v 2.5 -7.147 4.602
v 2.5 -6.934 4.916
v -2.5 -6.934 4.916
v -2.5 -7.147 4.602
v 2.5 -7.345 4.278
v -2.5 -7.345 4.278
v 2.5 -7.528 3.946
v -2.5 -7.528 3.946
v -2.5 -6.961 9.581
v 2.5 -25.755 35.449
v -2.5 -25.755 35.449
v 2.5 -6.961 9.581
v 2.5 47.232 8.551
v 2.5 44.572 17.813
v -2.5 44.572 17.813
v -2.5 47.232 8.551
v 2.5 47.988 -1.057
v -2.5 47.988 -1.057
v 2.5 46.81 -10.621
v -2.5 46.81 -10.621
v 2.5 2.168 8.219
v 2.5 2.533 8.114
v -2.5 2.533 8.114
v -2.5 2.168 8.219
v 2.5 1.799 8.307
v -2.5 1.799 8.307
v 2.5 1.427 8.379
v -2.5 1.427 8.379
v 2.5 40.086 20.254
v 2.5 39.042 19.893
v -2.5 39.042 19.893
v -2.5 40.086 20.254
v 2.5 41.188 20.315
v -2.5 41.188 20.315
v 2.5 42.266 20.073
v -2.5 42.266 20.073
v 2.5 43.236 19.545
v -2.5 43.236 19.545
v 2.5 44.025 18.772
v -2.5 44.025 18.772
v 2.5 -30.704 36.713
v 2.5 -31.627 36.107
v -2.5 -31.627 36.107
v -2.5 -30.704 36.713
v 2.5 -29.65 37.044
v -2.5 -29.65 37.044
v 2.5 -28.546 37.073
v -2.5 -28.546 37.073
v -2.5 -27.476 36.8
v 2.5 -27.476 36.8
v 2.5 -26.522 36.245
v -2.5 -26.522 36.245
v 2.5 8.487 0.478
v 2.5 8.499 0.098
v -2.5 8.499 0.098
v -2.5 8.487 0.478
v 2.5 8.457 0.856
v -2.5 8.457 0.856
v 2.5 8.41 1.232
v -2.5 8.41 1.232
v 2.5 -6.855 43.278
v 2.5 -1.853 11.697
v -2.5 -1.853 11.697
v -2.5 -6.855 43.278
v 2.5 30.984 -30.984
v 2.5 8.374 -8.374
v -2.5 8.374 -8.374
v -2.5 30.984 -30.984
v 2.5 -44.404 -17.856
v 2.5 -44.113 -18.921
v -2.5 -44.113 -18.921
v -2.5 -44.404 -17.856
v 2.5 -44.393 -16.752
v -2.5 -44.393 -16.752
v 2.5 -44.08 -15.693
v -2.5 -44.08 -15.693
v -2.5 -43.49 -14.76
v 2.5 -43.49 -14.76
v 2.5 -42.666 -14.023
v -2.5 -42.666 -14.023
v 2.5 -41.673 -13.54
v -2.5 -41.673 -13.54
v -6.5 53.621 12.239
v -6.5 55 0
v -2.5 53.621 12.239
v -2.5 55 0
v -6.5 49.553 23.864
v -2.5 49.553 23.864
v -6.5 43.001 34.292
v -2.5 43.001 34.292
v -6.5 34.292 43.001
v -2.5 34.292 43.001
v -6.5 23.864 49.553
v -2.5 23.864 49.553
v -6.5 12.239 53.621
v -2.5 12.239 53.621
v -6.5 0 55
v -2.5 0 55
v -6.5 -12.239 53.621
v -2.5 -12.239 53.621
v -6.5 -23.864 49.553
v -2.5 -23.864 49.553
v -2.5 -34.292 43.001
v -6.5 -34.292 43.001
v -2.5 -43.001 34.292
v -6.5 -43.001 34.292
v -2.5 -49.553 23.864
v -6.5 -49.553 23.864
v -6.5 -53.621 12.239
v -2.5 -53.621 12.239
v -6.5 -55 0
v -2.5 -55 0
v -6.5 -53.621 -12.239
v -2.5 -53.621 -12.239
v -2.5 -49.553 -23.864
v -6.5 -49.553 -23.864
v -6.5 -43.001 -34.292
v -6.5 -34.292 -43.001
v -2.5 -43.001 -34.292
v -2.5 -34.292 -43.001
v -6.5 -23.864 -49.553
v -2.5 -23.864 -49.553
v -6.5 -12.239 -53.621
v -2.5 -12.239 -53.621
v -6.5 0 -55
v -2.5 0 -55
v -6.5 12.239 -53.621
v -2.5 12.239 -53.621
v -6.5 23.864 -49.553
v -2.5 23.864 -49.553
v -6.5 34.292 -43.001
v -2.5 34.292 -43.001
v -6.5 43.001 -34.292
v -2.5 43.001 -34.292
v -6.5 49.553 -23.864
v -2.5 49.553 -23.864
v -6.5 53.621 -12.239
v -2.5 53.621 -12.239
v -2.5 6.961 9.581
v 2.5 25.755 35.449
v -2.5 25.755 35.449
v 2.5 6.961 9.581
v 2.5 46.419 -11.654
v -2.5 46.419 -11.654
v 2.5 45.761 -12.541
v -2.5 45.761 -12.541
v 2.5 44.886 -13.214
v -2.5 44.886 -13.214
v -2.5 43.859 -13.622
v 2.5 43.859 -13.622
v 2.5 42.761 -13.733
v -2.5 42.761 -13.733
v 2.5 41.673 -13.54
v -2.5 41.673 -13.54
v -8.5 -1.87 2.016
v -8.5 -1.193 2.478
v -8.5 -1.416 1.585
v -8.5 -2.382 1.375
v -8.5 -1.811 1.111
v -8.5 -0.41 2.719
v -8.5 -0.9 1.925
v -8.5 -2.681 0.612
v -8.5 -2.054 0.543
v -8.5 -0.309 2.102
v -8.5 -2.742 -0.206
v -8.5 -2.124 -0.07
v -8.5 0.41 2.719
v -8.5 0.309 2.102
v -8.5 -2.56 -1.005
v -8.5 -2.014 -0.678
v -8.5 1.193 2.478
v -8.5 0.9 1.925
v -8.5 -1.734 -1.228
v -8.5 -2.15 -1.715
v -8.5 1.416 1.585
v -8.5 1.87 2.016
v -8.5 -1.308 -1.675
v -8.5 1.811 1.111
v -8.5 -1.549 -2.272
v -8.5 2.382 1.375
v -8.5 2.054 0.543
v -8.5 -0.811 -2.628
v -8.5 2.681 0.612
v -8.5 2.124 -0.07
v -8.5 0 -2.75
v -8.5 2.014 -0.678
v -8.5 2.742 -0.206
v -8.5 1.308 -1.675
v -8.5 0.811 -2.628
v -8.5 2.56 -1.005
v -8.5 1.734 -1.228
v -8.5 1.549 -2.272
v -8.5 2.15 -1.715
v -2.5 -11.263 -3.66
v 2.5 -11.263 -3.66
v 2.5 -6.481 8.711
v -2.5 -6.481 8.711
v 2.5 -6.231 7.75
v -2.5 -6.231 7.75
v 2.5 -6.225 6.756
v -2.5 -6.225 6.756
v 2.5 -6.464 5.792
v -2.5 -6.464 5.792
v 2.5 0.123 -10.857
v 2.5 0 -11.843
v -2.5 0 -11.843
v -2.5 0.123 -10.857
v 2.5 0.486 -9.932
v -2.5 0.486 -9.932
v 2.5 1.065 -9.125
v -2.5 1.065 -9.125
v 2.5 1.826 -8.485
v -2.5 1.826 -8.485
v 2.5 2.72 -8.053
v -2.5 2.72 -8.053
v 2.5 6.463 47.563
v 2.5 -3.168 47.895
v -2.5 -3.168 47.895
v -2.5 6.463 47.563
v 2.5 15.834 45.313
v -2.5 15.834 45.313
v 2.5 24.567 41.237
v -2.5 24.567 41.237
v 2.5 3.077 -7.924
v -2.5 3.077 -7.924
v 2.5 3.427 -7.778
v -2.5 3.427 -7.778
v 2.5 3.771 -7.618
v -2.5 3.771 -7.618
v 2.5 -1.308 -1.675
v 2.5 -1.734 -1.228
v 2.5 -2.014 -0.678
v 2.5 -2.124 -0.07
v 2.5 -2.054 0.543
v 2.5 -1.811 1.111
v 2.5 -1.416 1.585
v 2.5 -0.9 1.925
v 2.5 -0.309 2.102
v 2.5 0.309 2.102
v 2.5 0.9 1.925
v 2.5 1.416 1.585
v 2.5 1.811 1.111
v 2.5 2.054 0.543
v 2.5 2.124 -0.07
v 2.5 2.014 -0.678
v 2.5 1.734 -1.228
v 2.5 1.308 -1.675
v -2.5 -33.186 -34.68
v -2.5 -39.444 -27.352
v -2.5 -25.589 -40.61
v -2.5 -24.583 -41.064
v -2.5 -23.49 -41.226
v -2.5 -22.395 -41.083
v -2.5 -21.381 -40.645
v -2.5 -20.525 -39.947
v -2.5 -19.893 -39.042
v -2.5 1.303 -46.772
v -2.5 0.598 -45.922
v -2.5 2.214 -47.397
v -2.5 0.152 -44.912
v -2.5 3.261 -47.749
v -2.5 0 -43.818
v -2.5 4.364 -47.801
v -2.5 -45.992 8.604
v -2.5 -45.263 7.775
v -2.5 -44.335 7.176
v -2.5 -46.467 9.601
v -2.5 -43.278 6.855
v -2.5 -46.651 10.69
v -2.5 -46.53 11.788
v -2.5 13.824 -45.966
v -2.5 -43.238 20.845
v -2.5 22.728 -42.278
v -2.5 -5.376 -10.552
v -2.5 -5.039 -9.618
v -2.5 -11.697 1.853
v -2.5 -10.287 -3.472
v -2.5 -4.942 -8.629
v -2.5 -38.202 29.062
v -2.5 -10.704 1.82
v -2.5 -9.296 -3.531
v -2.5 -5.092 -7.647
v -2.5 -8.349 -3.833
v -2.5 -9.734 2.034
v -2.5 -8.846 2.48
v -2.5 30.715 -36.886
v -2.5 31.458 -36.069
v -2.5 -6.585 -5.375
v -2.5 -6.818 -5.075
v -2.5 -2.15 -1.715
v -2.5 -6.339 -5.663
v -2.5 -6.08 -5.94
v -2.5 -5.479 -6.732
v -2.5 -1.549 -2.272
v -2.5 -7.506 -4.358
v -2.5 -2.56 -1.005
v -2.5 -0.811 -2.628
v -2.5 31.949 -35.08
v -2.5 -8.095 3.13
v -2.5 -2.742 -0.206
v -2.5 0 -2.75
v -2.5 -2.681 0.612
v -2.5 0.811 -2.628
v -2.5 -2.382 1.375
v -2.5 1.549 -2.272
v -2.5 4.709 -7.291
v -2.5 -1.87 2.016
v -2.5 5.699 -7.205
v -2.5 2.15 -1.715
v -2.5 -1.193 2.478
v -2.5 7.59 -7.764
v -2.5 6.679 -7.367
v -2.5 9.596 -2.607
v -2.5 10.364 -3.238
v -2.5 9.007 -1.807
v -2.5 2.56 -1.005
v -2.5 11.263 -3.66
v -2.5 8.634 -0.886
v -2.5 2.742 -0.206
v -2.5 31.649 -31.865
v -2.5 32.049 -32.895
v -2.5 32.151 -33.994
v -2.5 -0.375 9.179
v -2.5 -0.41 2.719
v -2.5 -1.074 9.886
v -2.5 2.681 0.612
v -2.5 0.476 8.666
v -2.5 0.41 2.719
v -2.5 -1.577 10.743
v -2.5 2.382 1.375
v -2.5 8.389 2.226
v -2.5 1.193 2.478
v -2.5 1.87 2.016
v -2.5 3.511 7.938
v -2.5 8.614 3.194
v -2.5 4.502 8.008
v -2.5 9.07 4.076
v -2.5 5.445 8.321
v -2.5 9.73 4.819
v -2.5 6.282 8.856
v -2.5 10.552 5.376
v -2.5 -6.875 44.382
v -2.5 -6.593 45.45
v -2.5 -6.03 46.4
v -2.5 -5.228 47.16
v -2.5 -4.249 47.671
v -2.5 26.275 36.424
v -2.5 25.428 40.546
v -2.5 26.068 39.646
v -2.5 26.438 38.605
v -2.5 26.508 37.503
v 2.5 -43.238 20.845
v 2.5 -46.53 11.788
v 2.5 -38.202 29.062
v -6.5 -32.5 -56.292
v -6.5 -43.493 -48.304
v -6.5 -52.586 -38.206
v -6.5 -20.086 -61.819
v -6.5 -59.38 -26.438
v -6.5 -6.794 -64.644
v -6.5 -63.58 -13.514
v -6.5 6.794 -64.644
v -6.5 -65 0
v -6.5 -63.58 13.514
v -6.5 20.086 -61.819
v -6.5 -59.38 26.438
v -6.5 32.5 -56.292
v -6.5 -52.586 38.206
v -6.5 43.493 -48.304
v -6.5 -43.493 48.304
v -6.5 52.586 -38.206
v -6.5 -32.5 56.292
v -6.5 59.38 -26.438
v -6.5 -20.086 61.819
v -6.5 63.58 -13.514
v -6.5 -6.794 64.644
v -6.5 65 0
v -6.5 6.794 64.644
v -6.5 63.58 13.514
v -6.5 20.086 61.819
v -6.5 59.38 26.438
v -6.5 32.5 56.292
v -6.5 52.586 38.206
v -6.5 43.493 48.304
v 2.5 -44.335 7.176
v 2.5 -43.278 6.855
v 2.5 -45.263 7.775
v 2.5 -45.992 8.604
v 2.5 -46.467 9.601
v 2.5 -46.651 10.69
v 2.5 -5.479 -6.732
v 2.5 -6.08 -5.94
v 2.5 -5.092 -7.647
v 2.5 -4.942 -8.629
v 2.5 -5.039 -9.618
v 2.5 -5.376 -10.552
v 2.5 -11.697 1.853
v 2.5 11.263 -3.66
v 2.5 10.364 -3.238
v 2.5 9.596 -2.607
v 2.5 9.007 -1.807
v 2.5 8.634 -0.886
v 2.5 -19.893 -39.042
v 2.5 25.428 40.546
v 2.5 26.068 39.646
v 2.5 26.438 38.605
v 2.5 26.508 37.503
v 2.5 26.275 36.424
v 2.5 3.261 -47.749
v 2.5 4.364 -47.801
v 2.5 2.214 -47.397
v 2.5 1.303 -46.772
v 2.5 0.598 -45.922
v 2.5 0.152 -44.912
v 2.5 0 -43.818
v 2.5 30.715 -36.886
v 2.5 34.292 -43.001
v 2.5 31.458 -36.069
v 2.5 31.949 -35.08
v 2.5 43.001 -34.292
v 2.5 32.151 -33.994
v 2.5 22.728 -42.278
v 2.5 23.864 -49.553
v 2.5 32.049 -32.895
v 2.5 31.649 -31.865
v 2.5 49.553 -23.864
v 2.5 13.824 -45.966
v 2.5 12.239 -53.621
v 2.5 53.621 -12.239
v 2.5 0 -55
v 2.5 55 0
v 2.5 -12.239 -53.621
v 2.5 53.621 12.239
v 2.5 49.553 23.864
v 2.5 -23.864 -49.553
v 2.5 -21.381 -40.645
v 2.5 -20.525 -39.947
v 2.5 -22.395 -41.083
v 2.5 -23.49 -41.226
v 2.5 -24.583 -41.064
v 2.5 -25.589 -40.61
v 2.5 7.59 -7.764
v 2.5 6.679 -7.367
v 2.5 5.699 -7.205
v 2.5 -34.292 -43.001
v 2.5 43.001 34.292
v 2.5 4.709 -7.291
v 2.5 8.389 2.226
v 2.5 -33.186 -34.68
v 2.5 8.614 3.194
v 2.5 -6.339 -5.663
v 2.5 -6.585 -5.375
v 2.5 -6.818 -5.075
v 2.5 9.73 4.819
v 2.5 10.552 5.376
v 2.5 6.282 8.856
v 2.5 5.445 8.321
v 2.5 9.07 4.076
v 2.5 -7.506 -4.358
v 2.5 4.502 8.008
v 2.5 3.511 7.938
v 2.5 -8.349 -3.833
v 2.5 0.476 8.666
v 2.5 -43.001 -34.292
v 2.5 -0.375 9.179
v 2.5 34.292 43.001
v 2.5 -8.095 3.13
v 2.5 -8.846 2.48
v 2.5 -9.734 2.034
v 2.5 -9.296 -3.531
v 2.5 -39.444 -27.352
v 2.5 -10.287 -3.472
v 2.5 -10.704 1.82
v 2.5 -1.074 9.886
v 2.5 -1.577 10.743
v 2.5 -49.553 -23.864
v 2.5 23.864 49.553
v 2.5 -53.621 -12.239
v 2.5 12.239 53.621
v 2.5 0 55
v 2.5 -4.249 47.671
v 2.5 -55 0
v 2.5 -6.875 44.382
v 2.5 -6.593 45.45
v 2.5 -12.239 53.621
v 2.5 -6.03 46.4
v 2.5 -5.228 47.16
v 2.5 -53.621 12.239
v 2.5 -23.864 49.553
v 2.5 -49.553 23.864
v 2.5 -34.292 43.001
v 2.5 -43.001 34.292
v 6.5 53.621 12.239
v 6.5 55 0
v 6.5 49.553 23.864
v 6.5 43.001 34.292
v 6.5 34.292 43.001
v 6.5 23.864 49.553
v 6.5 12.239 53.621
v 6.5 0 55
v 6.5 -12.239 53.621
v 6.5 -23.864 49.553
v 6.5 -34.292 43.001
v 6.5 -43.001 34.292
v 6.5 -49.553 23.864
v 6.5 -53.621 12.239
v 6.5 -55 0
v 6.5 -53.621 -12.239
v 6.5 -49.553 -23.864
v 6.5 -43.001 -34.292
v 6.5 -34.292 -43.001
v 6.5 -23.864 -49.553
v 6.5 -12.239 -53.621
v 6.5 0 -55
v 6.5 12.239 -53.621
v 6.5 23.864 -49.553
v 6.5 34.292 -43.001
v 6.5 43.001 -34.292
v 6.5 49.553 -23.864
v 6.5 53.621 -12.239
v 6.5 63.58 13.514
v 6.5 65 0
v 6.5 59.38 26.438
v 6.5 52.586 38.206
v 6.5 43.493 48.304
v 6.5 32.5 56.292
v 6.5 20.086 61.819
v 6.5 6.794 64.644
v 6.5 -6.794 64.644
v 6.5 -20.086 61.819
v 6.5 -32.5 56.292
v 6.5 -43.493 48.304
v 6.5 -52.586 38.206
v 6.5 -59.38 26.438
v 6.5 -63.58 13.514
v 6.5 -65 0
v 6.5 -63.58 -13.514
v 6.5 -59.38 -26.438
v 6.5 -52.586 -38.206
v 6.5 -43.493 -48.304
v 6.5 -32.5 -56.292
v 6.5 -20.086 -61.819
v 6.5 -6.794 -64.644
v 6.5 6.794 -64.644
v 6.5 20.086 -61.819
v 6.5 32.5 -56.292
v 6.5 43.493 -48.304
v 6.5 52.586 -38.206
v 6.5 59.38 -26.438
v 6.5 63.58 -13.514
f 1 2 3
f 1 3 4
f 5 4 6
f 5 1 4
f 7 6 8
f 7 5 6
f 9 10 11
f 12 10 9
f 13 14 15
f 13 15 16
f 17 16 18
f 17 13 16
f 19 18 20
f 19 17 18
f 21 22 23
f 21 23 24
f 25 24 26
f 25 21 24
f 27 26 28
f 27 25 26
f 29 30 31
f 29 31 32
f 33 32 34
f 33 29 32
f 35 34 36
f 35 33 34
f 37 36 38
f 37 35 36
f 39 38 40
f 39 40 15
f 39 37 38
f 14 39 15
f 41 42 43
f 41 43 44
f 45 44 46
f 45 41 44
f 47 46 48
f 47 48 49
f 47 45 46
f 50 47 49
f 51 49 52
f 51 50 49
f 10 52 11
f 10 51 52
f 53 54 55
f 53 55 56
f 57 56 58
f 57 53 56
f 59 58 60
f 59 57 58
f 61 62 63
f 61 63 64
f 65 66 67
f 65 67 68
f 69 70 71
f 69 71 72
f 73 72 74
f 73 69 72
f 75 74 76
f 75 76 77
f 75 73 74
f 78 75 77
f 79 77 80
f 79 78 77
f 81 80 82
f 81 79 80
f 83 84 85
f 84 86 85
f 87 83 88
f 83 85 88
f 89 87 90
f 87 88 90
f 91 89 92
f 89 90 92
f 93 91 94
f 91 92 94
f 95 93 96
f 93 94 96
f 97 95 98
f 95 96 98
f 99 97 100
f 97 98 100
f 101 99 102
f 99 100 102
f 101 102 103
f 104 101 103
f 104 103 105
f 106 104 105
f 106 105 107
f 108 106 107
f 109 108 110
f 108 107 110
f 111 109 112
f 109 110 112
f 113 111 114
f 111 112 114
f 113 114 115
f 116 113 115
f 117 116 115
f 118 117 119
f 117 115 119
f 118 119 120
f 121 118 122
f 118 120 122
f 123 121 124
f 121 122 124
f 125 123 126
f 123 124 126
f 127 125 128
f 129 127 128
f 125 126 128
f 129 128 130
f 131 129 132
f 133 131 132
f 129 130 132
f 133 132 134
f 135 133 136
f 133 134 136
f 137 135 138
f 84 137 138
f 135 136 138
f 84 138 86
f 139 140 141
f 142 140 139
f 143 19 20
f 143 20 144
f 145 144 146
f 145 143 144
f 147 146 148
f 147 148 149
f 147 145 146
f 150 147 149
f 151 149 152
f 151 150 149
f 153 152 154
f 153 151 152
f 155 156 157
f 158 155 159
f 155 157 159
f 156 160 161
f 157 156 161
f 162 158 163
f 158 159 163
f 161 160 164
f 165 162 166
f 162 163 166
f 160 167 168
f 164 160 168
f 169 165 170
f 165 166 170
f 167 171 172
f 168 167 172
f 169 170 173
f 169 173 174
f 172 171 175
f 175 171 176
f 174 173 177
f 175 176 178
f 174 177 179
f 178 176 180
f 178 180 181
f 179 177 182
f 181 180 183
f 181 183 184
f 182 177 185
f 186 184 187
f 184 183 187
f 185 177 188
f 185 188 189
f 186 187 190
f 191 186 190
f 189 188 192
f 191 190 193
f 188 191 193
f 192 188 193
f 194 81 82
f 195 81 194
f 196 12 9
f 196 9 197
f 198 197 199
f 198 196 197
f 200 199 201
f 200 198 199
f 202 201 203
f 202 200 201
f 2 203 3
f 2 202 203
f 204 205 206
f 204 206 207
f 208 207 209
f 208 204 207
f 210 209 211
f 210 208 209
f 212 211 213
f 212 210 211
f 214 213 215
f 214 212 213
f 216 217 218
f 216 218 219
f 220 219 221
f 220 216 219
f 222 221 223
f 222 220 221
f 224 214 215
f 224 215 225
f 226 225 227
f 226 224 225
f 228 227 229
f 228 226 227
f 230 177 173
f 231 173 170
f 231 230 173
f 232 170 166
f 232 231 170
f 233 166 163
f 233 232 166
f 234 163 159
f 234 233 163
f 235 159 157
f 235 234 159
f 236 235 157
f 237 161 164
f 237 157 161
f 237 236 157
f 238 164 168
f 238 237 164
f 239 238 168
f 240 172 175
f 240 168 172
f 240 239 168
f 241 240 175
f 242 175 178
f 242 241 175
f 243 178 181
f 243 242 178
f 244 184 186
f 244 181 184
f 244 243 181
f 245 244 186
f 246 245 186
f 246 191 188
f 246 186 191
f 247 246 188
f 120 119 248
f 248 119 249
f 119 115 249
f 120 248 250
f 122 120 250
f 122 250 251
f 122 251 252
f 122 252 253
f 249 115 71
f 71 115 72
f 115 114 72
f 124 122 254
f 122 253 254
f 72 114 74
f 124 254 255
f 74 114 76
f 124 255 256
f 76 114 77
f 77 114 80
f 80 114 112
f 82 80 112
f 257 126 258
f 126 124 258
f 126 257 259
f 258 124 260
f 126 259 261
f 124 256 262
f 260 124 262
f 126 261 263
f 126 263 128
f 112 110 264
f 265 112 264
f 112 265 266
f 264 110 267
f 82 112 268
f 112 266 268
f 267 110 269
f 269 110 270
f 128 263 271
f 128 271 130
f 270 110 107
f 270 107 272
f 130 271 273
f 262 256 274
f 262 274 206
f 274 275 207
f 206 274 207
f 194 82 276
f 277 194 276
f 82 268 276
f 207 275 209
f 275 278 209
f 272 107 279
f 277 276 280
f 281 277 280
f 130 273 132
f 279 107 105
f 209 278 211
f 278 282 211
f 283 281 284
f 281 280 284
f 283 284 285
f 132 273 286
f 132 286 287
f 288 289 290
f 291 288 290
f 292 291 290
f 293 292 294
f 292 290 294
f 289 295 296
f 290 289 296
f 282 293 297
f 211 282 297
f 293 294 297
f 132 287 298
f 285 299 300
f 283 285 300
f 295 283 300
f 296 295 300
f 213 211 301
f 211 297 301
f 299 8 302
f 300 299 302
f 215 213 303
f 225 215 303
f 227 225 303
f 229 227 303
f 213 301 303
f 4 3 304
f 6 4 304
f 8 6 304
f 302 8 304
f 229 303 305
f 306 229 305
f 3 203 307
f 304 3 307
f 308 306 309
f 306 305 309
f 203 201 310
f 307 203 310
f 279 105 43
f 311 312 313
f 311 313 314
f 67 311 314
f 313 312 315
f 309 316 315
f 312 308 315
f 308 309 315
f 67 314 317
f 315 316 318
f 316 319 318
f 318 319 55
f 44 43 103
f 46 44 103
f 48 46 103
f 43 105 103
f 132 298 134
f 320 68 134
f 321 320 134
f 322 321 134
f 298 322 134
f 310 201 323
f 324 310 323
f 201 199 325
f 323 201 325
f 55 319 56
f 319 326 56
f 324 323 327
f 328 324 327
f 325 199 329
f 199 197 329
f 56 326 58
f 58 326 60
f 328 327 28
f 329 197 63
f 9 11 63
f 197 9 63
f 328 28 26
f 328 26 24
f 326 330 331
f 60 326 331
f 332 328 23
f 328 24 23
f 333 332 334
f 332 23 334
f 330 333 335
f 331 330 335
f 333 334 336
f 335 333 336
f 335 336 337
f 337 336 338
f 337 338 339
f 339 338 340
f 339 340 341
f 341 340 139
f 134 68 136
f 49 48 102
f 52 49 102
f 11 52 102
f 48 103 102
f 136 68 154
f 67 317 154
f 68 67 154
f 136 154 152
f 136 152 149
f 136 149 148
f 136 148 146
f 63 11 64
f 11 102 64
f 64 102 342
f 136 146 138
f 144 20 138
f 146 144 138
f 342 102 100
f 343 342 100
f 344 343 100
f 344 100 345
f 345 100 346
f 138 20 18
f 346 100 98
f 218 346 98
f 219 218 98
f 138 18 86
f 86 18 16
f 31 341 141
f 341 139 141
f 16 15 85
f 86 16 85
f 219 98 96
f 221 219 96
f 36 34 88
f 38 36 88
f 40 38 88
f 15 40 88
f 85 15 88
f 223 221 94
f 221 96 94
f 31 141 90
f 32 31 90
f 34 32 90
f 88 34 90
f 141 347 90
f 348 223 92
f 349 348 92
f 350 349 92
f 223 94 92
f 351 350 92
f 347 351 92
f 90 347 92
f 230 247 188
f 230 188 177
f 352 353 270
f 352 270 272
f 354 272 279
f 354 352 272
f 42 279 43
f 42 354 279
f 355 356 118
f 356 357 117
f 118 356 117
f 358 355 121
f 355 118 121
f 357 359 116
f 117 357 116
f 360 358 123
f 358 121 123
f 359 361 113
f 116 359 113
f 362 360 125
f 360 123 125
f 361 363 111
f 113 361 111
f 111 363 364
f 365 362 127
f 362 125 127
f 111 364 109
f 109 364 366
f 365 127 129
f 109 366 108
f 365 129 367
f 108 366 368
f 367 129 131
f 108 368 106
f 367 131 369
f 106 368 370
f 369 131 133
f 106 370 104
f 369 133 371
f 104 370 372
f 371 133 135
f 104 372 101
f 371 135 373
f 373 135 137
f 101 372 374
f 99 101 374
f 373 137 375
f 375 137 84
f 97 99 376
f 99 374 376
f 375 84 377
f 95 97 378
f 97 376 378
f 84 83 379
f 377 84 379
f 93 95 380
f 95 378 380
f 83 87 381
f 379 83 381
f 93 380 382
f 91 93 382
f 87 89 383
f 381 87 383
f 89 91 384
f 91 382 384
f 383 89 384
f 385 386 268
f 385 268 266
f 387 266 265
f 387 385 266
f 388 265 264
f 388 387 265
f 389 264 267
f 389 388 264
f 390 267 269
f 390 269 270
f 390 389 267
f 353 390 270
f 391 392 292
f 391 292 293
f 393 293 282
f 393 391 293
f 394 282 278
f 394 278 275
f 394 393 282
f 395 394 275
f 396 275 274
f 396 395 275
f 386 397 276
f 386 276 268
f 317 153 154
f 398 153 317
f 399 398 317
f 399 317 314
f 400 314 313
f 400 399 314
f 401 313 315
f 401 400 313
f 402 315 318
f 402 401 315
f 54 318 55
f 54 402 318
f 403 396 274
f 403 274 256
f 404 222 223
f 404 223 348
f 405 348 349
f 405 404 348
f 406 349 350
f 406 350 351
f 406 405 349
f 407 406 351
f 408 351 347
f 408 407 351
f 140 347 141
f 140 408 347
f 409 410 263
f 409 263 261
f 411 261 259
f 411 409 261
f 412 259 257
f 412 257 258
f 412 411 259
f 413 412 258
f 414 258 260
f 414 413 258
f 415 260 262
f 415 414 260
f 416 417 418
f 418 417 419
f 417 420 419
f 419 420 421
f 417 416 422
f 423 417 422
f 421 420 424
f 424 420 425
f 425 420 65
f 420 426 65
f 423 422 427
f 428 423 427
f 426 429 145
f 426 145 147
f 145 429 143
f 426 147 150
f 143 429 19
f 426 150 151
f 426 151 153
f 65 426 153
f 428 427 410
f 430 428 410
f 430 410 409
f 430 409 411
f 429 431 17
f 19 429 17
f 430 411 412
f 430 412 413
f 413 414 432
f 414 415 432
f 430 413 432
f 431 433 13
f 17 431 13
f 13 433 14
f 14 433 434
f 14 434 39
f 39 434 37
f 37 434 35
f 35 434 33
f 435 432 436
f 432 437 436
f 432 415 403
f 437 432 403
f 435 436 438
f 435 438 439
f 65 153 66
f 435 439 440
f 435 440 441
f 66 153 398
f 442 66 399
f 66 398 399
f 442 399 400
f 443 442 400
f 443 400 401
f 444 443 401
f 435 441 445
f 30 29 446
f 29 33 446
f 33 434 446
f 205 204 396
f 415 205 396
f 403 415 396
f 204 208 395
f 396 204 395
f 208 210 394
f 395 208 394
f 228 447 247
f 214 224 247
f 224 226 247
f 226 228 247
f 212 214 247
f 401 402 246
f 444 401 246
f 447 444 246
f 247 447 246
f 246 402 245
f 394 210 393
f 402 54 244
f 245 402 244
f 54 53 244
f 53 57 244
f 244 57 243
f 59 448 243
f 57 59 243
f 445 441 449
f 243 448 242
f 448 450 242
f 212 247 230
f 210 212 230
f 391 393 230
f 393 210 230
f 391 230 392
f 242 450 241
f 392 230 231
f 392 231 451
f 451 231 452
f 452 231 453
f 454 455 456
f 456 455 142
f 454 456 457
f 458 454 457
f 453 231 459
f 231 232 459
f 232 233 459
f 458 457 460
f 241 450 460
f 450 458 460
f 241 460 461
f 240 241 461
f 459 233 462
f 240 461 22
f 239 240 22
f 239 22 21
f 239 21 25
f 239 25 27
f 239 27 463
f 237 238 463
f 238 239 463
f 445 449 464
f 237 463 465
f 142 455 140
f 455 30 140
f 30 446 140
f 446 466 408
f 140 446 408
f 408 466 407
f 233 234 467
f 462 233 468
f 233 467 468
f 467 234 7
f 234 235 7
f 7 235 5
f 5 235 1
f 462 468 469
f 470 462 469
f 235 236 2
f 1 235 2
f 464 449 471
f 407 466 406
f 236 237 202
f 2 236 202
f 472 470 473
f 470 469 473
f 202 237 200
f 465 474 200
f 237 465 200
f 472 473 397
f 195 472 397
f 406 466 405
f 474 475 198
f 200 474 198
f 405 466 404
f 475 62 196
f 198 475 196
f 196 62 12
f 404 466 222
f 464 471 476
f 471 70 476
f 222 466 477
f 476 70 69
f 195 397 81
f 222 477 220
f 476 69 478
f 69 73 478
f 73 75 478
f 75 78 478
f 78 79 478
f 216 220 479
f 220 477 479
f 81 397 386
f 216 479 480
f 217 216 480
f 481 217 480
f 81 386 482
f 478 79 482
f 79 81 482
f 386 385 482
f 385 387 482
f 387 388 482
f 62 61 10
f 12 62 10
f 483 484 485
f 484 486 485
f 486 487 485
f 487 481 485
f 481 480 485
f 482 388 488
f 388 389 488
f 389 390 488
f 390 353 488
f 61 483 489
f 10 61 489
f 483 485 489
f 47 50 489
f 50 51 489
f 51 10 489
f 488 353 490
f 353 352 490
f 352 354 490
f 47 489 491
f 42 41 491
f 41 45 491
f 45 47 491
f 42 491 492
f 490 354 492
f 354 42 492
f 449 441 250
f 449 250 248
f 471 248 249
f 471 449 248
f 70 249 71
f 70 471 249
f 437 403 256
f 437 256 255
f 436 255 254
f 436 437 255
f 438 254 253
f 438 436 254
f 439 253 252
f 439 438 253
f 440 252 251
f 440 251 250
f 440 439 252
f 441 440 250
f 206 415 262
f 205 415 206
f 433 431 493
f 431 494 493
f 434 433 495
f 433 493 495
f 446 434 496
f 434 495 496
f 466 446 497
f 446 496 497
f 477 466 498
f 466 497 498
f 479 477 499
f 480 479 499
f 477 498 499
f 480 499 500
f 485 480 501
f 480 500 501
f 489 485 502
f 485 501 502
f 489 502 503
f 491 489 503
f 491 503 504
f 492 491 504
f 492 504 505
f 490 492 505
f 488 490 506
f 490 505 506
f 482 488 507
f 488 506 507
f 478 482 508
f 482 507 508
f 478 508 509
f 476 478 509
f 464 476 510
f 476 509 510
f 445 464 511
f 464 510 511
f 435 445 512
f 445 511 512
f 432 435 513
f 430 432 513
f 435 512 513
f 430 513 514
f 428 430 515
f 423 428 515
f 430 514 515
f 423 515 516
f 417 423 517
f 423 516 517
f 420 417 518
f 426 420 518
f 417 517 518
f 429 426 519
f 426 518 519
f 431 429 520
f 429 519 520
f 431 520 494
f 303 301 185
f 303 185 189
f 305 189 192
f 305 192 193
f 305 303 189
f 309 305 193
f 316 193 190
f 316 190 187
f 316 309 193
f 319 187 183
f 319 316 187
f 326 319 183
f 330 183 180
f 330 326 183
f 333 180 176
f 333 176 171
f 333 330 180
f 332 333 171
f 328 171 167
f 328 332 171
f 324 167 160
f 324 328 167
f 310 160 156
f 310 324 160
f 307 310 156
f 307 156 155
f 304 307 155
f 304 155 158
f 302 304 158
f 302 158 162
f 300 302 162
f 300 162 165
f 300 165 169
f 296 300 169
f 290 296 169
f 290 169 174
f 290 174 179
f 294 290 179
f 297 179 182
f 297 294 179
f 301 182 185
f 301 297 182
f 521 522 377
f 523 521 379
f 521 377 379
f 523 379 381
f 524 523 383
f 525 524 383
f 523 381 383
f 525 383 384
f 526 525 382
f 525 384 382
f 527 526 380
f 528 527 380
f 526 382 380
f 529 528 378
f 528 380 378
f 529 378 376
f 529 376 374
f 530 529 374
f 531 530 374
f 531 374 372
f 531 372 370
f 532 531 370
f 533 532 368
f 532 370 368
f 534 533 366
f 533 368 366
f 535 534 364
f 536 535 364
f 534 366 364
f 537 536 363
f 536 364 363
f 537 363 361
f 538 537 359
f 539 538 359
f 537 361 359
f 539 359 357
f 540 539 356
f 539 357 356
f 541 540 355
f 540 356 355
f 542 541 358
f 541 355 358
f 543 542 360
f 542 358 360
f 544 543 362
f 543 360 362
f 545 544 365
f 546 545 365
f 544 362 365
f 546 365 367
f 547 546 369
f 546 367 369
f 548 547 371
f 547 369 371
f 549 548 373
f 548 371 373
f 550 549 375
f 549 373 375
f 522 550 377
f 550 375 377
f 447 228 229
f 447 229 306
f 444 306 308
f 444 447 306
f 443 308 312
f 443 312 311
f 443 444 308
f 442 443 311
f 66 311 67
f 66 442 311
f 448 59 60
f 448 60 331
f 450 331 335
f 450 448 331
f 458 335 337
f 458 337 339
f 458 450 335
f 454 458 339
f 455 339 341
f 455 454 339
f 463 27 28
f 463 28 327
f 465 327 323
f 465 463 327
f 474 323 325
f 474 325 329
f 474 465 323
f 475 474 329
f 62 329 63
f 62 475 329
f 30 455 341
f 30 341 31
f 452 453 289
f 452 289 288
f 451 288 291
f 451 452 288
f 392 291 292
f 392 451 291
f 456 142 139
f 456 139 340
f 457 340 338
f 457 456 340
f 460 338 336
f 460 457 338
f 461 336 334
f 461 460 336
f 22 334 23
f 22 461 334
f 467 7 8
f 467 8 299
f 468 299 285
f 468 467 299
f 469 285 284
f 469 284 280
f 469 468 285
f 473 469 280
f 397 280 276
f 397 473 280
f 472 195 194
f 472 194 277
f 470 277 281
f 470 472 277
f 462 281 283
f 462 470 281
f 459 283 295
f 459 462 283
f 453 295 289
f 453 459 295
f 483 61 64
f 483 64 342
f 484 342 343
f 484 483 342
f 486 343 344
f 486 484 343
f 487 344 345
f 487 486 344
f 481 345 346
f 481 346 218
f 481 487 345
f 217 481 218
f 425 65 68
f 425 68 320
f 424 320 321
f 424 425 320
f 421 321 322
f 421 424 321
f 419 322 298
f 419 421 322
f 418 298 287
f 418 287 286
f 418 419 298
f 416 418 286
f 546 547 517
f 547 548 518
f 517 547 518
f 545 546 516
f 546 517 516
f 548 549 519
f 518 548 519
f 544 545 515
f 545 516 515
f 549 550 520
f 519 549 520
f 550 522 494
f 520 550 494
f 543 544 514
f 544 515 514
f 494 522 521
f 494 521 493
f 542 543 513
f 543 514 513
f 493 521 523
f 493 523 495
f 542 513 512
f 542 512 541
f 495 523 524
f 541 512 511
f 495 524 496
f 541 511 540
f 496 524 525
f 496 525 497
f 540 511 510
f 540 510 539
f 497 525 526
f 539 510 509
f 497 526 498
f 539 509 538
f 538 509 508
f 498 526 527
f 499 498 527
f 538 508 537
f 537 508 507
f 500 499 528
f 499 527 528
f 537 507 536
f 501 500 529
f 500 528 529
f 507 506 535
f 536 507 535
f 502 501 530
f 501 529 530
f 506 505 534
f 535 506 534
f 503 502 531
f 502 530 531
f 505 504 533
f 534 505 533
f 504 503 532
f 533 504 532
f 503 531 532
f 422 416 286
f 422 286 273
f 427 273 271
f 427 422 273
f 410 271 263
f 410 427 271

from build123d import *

# Parameters (mm, degrees)
CUT_EXTRUDE1_DEPTH  = 5
CIRPATTERN1_COUNT   = 5
SKETCH8_R           = 2.75
BOSS_EXTRUDE1_DEPTH = 6
CUT_EXTRUDE2_REACH  = 13


with BuildPart() as part:
    # Sketch3 → Shape_Roue (revolve)
    with BuildSketch(Plane.XY):
        Polygon((-2.5, 0), (2.5, 0), (2.5, 55), (6.5, 55), (6.5, 65), (-6.5, 65), (-6.5, 55), (-2.5, 55), align=None)
    revolve(axis=Axis((-2.5, 0, 0), (1, 0, 0)))

    # Sketch6 → Cut-Extrude1 (cut)
    with BuildSketch(Plane(origin=(2.5, 0, 0), x_dir=(0, 0, -1), z_dir=(1, 0, 0))):
        with BuildLine():
            Line((8.374067112, 8.374067112), (30.98386677, 30.98386677))
            ThreePointArc((30.98386677, 30.98386677), (33.994300587, 32.151296695), (36.886138794, 30.715025067))
            ThreePointArc((36.886138794, 30.715025067), (44.346217561, 18.368804754), (47.801241382, 4.363636364))
            ThreePointArc((47.801241382, 4.363636364), (46.772000384, 1.30320055), (43.8178046, 0))
            Line((43.8178046, 0), (11.842719282, 0))
            ThreePointArc((11.842719282, 0), (9.510338524, 0.750384638), (8.053049112, 2.72))
            ThreePointArc((8.053049112, 2.72), (7.852976026, 3.252809175), (7.617696081, 3.771035191))
            ThreePointArc((7.617696081, 3.771035191), (7.255426928, 6.194222796), (8.374067112, 8.374067112))
        make_face()
    cut_extrude1 = extrude(amount=-CUT_EXTRUDE1_DEPTH, mode=Mode.SUBTRACT)

    # CirPattern1: Cut-Extrude1 ×5 about axis
    cirpattern1_axis = Axis((0, 0, 0), (1, 0, 0))
    for i in range(1, CIRPATTERN1_COUNT):
        add(cut_extrude1.rotate(cirpattern1_axis, i * 360 / CIRPATTERN1_COUNT), mode=Mode.SUBTRACT)

    # Sketch8 → Boss-Extrude1 (add)
    with BuildSketch(Plane(origin=(-2.5, 0, 0), x_dir=(0, 0, -1), z_dir=(1, 0, 0))):
        Circle(SKETCH8_R)
    extrude(amount=-BOSS_EXTRUDE1_DEPTH)

    # Sketch7 → Cut-Extrude2 (cut, up to next)
    with BuildSketch(Plane(origin=(2.5, 0, 0), x_dir=(0, 0, -1), z_dir=(1, 0, 0)), mode=Mode.PRIVATE) as cut_extrude2_sk1:
        with BuildLine():
            Line((1.675, 1.307669683), (1.675, -1.307669683))
            ThreePointArc((1.675, -1.307669683), (-2.125, 0), (1.675, 1.307669683))
        make_face()
    cut_extrude2_tool1 = extrude(cut_extrude2_sk1.sketch, amount=-CUT_EXTRUDE2_REACH, mode=Mode.PRIVATE) & part.part
    add(cut_extrude2_tool1.solids().sort_by_distance((2.5, 0, 0.111388))[0], mode=Mode.SUBTRACT)


solid = part.part
